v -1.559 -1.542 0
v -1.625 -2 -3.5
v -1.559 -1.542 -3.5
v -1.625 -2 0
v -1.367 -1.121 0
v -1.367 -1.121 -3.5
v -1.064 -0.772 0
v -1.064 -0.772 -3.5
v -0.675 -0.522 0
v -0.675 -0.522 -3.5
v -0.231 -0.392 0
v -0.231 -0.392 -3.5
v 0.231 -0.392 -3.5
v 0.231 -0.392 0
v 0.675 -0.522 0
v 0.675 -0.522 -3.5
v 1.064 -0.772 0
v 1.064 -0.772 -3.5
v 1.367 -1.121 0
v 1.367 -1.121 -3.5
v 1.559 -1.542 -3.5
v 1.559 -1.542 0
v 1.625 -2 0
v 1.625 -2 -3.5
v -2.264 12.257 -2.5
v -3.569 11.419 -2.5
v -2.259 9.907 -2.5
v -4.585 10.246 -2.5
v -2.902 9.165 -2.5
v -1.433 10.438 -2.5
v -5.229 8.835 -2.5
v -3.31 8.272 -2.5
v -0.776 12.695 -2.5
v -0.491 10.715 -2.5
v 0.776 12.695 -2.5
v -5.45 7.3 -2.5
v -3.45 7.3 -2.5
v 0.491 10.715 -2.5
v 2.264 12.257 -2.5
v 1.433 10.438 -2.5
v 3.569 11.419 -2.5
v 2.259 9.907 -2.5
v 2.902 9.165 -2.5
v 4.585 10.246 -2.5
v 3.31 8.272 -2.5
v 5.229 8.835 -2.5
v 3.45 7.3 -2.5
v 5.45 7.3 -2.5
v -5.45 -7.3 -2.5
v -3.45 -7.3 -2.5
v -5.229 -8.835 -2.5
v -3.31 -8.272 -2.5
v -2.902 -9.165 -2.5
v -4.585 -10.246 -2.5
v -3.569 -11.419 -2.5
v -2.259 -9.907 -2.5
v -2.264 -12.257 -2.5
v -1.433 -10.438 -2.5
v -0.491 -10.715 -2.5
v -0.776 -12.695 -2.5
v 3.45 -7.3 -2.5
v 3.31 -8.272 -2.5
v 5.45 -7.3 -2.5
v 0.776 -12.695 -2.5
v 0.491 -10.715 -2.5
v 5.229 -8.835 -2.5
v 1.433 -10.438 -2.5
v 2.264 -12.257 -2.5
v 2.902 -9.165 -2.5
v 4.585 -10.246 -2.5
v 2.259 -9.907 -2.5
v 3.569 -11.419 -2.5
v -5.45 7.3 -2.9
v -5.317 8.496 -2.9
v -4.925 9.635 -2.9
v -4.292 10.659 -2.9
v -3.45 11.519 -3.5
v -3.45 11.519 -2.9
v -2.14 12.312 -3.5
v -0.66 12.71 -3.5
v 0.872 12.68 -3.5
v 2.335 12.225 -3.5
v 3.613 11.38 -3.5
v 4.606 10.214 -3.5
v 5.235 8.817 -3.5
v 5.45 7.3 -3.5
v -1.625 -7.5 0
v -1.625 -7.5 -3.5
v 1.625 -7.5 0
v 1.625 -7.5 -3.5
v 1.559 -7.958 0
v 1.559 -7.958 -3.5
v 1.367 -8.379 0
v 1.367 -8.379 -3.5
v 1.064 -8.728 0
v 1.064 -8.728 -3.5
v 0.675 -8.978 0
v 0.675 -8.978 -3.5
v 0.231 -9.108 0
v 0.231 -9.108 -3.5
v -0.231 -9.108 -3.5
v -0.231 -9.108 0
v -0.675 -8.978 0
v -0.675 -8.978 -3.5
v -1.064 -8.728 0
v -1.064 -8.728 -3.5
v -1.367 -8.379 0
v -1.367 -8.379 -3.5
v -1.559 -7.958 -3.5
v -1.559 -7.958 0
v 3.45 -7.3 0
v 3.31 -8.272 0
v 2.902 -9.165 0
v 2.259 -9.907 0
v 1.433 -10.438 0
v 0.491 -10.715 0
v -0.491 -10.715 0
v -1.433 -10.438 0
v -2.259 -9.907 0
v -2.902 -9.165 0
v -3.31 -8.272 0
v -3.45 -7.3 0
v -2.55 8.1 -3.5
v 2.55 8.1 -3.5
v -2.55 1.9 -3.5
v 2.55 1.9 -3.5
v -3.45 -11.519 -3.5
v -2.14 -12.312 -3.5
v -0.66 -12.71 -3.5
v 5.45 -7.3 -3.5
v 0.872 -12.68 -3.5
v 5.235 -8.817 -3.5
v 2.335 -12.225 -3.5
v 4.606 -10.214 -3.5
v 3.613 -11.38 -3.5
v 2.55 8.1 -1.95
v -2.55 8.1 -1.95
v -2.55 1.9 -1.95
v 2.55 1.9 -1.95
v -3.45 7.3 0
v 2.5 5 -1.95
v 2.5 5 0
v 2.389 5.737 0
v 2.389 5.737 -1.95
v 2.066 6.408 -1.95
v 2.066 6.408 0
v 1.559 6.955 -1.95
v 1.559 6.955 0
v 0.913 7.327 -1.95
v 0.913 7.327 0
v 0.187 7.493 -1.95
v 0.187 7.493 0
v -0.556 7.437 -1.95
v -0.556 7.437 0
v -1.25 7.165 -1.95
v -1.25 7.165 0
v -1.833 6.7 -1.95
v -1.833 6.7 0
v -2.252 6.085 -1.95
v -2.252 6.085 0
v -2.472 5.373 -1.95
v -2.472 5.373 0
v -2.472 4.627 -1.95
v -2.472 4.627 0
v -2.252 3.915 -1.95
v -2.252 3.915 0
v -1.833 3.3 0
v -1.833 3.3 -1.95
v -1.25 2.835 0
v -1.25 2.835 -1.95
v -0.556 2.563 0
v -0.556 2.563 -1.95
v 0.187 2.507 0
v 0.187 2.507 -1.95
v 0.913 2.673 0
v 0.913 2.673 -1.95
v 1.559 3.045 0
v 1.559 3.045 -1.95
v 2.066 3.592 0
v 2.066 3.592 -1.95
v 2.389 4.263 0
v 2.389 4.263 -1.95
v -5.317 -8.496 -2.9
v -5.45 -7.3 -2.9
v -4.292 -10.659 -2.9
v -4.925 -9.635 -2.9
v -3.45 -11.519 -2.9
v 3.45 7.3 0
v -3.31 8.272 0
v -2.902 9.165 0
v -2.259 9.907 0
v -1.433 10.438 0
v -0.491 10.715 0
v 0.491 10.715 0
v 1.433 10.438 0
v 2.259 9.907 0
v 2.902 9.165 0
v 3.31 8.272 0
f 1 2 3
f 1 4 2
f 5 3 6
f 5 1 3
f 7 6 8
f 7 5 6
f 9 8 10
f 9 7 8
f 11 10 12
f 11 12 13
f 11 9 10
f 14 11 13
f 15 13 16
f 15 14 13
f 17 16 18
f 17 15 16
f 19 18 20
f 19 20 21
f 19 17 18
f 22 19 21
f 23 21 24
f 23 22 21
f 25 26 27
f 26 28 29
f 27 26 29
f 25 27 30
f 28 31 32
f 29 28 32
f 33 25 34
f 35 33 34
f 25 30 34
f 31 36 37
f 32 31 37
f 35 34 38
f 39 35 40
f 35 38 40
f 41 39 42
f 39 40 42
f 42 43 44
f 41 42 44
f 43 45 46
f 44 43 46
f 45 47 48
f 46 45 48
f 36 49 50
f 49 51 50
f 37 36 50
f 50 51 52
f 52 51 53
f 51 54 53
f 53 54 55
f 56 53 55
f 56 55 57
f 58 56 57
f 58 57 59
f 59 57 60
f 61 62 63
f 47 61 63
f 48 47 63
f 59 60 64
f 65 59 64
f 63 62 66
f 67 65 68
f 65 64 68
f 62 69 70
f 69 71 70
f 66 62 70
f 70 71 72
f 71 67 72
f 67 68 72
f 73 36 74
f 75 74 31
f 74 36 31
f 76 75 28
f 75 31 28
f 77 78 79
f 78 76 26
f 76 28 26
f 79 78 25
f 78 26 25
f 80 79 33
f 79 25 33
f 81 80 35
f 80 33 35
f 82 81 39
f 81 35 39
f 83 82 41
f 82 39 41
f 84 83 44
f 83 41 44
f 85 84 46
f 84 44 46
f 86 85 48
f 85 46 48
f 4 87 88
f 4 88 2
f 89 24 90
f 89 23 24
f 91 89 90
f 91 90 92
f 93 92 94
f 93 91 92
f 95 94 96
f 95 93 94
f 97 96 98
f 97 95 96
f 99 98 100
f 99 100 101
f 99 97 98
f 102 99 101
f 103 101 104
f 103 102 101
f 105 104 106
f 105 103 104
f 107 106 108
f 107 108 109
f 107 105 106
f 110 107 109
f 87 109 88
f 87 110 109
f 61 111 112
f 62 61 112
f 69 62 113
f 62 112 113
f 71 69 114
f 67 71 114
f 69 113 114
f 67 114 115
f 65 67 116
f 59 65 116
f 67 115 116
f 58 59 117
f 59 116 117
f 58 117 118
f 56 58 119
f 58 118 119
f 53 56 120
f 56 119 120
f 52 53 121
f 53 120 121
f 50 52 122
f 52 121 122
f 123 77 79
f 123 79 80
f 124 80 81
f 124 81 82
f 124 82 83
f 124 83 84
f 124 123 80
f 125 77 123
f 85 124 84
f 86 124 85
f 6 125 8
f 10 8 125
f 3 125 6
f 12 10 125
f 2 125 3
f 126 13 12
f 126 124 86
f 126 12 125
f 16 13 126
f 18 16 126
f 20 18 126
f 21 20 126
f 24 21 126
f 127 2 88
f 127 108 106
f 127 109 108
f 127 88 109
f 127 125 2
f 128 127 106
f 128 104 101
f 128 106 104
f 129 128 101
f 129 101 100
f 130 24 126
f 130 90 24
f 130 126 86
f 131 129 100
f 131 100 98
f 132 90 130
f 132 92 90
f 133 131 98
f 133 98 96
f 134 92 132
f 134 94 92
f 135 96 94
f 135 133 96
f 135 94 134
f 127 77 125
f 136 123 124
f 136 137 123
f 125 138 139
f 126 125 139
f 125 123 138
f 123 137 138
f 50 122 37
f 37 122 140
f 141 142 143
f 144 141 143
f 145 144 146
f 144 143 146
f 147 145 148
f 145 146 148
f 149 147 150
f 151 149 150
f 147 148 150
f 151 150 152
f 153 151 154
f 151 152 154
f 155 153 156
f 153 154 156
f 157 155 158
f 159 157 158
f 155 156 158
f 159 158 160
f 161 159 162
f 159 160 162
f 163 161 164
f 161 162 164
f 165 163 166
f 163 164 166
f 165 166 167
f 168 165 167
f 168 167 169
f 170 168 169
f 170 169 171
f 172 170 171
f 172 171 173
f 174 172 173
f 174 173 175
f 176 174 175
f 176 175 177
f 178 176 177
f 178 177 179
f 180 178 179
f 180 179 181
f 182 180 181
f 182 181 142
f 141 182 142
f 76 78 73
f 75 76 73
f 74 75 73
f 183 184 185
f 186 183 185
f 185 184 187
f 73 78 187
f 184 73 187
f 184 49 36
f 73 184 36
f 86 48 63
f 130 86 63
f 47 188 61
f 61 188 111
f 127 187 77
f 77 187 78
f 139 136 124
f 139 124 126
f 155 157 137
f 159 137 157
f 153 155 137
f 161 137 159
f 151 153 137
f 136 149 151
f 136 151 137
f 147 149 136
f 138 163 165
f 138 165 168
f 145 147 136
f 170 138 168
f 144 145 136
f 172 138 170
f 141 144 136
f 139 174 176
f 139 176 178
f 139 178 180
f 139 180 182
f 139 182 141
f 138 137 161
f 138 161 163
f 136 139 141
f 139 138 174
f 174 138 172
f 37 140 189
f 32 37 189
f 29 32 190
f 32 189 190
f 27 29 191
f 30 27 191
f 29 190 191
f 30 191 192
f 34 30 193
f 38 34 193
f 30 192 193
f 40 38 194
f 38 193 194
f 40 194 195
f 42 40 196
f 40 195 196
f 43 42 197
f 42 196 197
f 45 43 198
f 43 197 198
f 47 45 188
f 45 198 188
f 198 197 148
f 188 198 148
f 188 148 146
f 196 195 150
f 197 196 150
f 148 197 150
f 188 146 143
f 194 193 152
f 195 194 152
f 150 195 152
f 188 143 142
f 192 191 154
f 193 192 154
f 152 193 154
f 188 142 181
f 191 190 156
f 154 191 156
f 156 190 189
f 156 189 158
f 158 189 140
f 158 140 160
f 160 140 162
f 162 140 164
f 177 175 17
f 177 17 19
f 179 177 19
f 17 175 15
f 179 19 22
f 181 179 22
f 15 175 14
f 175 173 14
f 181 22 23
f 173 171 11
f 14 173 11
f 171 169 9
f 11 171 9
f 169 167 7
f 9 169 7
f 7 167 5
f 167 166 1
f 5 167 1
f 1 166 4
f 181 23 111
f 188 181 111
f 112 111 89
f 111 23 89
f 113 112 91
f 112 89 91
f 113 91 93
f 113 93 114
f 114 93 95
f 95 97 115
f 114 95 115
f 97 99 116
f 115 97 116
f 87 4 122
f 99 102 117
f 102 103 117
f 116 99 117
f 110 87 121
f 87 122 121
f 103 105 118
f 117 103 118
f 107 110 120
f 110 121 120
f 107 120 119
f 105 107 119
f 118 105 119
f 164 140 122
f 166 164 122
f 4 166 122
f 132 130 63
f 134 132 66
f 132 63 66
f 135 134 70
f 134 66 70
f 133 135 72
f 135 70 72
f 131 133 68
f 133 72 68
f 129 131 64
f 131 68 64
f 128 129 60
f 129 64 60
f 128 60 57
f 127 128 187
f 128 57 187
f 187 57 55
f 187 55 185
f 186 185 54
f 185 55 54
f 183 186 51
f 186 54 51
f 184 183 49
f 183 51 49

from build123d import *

# Parameters (mm, degrees)
BOSS_EXTRUDE1_DEPTH = 2.5
SKETCH3_R           = 2.5
CUT_EXTRUDE1_DEPTH  = 4
SKETCH4_W           = 5.1
SKETCH4_H           = 6.2
BOSS_EXTRUDE2_DEPTH = 1
SKETCH5_W           = 5.1
SKETCH5_H           = 6.2
CUT_EXTRUDE2_DEPTH  = 0.55
CUT_EXTRUDE3_START  = -0.6
CUT_EXTRUDE3_DEPTH  = 0.6


with BuildPart() as part:
    # Sketch1 → Boss-Extrude1 (new body)
    with BuildSketch(Plane(origin=(0, 0, 0), x_dir=(0, 1, 0), z_dir=(0, 0, 1))):
        with BuildLine():
            Line((-7.3, 3.45), (7.3, 3.45))
            ThreePointArc((7.3, 3.45), (10.75, 0), (7.3, -3.45))
            Line((7.3, -3.45), (-7.3, -3.45))
            ThreePointArc((-7.3, -3.45), (-10.75, 0), (-7.3, 3.45))
        make_face()
    extrude(amount=-BOSS_EXTRUDE1_DEPTH)

    # Sketch3 → Cut-Extrude1 (cut)
    with BuildSketch(Plane.XY):
        with Locations((0, 5)):
            Circle(SKETCH3_R)
        with BuildLine():
            Line((-1.625, -7.5), (-1.625, -2))
            ThreePointArc((-1.625, -2), (0, -0.375), (1.625, -2))
            Line((1.625, -2), (1.625, -7.5))
            ThreePointArc((1.625, -7.5), (0, -9.125), (-1.625, -7.5))
        make_face()
    extrude(amount=-CUT_EXTRUDE1_DEPTH, mode=Mode.SUBTRACT)

    # Sketch4 → Boss-Extrude2 (add)
    with BuildSketch(Plane(origin=(0, 0, -2.5), x_dir=(1, 0, 0), z_dir=(0, 0, -1))):
        with BuildLine():
            Line((-5.45, 7.3), (-5.45, -7.3))
            ThreePointArc((-5.45, -7.3), (0, -12.75), (5.45, -7.3))
            Line((5.45, -7.3), (5.45, 7.3))
            ThreePointArc((5.45, 7.3), (0, 12.75), (-5.45, 7.3))
        make_face()
        with BuildLine():
            Line((1.625, 2), (1.625, 7.5))
            ThreePointArc((1.625, 7.5), (0, 9.125), (-1.625, 7.5))
            Line((-1.625, 7.5), (-1.625, 2))
            ThreePointArc((-1.625, 2), (0, 0.375), (1.625, 2))
        make_face(mode=Mode.SUBTRACT)
        with Locations((0, -5)):
            Rectangle(SKETCH4_W, SKETCH4_H, mode=Mode.SUBTRACT)
    extrude(amount=BOSS_EXTRUDE2_DEPTH)

    # Sketch5 → Cut-Extrude2 (cut)
    with BuildSketch(Plane(origin=(0, 0, -2.5), x_dir=(1, 0, 0), z_dir=(0, 0, -1))):
        with Locations((0, -5)):
            Rectangle(SKETCH5_W, SKETCH5_H)
    extrude(amount=-CUT_EXTRUDE2_DEPTH, mode=Mode.SUBTRACT)

    # Sketch6 → Cut-Extrude3 (cut)
    with BuildSketch(Plane(origin=(0, 0, -3.5), x_dir=(1, 0, 0), z_dir=(0, 0, -1)).offset(CUT_EXTRUDE3_START)):
        with BuildLine():
            Line((-5.45, -7.3), (-5.45, 7.3))
            ThreePointArc((-5.45, 7.3), (-4.924682731, 9.634523506), (-3.45, 11.519004622))
            Line((-3.45, 11.519004622), (-3.45, -11.519004622))
            ThreePointArc((-3.45, -11.519004622), (-4.924682731, -9.634523506), (-5.45, -7.3))
        make_face()
    extrude(amount=CUT_EXTRUDE3_DEPTH, mode=Mode.SUBTRACT)


solid = part.part
